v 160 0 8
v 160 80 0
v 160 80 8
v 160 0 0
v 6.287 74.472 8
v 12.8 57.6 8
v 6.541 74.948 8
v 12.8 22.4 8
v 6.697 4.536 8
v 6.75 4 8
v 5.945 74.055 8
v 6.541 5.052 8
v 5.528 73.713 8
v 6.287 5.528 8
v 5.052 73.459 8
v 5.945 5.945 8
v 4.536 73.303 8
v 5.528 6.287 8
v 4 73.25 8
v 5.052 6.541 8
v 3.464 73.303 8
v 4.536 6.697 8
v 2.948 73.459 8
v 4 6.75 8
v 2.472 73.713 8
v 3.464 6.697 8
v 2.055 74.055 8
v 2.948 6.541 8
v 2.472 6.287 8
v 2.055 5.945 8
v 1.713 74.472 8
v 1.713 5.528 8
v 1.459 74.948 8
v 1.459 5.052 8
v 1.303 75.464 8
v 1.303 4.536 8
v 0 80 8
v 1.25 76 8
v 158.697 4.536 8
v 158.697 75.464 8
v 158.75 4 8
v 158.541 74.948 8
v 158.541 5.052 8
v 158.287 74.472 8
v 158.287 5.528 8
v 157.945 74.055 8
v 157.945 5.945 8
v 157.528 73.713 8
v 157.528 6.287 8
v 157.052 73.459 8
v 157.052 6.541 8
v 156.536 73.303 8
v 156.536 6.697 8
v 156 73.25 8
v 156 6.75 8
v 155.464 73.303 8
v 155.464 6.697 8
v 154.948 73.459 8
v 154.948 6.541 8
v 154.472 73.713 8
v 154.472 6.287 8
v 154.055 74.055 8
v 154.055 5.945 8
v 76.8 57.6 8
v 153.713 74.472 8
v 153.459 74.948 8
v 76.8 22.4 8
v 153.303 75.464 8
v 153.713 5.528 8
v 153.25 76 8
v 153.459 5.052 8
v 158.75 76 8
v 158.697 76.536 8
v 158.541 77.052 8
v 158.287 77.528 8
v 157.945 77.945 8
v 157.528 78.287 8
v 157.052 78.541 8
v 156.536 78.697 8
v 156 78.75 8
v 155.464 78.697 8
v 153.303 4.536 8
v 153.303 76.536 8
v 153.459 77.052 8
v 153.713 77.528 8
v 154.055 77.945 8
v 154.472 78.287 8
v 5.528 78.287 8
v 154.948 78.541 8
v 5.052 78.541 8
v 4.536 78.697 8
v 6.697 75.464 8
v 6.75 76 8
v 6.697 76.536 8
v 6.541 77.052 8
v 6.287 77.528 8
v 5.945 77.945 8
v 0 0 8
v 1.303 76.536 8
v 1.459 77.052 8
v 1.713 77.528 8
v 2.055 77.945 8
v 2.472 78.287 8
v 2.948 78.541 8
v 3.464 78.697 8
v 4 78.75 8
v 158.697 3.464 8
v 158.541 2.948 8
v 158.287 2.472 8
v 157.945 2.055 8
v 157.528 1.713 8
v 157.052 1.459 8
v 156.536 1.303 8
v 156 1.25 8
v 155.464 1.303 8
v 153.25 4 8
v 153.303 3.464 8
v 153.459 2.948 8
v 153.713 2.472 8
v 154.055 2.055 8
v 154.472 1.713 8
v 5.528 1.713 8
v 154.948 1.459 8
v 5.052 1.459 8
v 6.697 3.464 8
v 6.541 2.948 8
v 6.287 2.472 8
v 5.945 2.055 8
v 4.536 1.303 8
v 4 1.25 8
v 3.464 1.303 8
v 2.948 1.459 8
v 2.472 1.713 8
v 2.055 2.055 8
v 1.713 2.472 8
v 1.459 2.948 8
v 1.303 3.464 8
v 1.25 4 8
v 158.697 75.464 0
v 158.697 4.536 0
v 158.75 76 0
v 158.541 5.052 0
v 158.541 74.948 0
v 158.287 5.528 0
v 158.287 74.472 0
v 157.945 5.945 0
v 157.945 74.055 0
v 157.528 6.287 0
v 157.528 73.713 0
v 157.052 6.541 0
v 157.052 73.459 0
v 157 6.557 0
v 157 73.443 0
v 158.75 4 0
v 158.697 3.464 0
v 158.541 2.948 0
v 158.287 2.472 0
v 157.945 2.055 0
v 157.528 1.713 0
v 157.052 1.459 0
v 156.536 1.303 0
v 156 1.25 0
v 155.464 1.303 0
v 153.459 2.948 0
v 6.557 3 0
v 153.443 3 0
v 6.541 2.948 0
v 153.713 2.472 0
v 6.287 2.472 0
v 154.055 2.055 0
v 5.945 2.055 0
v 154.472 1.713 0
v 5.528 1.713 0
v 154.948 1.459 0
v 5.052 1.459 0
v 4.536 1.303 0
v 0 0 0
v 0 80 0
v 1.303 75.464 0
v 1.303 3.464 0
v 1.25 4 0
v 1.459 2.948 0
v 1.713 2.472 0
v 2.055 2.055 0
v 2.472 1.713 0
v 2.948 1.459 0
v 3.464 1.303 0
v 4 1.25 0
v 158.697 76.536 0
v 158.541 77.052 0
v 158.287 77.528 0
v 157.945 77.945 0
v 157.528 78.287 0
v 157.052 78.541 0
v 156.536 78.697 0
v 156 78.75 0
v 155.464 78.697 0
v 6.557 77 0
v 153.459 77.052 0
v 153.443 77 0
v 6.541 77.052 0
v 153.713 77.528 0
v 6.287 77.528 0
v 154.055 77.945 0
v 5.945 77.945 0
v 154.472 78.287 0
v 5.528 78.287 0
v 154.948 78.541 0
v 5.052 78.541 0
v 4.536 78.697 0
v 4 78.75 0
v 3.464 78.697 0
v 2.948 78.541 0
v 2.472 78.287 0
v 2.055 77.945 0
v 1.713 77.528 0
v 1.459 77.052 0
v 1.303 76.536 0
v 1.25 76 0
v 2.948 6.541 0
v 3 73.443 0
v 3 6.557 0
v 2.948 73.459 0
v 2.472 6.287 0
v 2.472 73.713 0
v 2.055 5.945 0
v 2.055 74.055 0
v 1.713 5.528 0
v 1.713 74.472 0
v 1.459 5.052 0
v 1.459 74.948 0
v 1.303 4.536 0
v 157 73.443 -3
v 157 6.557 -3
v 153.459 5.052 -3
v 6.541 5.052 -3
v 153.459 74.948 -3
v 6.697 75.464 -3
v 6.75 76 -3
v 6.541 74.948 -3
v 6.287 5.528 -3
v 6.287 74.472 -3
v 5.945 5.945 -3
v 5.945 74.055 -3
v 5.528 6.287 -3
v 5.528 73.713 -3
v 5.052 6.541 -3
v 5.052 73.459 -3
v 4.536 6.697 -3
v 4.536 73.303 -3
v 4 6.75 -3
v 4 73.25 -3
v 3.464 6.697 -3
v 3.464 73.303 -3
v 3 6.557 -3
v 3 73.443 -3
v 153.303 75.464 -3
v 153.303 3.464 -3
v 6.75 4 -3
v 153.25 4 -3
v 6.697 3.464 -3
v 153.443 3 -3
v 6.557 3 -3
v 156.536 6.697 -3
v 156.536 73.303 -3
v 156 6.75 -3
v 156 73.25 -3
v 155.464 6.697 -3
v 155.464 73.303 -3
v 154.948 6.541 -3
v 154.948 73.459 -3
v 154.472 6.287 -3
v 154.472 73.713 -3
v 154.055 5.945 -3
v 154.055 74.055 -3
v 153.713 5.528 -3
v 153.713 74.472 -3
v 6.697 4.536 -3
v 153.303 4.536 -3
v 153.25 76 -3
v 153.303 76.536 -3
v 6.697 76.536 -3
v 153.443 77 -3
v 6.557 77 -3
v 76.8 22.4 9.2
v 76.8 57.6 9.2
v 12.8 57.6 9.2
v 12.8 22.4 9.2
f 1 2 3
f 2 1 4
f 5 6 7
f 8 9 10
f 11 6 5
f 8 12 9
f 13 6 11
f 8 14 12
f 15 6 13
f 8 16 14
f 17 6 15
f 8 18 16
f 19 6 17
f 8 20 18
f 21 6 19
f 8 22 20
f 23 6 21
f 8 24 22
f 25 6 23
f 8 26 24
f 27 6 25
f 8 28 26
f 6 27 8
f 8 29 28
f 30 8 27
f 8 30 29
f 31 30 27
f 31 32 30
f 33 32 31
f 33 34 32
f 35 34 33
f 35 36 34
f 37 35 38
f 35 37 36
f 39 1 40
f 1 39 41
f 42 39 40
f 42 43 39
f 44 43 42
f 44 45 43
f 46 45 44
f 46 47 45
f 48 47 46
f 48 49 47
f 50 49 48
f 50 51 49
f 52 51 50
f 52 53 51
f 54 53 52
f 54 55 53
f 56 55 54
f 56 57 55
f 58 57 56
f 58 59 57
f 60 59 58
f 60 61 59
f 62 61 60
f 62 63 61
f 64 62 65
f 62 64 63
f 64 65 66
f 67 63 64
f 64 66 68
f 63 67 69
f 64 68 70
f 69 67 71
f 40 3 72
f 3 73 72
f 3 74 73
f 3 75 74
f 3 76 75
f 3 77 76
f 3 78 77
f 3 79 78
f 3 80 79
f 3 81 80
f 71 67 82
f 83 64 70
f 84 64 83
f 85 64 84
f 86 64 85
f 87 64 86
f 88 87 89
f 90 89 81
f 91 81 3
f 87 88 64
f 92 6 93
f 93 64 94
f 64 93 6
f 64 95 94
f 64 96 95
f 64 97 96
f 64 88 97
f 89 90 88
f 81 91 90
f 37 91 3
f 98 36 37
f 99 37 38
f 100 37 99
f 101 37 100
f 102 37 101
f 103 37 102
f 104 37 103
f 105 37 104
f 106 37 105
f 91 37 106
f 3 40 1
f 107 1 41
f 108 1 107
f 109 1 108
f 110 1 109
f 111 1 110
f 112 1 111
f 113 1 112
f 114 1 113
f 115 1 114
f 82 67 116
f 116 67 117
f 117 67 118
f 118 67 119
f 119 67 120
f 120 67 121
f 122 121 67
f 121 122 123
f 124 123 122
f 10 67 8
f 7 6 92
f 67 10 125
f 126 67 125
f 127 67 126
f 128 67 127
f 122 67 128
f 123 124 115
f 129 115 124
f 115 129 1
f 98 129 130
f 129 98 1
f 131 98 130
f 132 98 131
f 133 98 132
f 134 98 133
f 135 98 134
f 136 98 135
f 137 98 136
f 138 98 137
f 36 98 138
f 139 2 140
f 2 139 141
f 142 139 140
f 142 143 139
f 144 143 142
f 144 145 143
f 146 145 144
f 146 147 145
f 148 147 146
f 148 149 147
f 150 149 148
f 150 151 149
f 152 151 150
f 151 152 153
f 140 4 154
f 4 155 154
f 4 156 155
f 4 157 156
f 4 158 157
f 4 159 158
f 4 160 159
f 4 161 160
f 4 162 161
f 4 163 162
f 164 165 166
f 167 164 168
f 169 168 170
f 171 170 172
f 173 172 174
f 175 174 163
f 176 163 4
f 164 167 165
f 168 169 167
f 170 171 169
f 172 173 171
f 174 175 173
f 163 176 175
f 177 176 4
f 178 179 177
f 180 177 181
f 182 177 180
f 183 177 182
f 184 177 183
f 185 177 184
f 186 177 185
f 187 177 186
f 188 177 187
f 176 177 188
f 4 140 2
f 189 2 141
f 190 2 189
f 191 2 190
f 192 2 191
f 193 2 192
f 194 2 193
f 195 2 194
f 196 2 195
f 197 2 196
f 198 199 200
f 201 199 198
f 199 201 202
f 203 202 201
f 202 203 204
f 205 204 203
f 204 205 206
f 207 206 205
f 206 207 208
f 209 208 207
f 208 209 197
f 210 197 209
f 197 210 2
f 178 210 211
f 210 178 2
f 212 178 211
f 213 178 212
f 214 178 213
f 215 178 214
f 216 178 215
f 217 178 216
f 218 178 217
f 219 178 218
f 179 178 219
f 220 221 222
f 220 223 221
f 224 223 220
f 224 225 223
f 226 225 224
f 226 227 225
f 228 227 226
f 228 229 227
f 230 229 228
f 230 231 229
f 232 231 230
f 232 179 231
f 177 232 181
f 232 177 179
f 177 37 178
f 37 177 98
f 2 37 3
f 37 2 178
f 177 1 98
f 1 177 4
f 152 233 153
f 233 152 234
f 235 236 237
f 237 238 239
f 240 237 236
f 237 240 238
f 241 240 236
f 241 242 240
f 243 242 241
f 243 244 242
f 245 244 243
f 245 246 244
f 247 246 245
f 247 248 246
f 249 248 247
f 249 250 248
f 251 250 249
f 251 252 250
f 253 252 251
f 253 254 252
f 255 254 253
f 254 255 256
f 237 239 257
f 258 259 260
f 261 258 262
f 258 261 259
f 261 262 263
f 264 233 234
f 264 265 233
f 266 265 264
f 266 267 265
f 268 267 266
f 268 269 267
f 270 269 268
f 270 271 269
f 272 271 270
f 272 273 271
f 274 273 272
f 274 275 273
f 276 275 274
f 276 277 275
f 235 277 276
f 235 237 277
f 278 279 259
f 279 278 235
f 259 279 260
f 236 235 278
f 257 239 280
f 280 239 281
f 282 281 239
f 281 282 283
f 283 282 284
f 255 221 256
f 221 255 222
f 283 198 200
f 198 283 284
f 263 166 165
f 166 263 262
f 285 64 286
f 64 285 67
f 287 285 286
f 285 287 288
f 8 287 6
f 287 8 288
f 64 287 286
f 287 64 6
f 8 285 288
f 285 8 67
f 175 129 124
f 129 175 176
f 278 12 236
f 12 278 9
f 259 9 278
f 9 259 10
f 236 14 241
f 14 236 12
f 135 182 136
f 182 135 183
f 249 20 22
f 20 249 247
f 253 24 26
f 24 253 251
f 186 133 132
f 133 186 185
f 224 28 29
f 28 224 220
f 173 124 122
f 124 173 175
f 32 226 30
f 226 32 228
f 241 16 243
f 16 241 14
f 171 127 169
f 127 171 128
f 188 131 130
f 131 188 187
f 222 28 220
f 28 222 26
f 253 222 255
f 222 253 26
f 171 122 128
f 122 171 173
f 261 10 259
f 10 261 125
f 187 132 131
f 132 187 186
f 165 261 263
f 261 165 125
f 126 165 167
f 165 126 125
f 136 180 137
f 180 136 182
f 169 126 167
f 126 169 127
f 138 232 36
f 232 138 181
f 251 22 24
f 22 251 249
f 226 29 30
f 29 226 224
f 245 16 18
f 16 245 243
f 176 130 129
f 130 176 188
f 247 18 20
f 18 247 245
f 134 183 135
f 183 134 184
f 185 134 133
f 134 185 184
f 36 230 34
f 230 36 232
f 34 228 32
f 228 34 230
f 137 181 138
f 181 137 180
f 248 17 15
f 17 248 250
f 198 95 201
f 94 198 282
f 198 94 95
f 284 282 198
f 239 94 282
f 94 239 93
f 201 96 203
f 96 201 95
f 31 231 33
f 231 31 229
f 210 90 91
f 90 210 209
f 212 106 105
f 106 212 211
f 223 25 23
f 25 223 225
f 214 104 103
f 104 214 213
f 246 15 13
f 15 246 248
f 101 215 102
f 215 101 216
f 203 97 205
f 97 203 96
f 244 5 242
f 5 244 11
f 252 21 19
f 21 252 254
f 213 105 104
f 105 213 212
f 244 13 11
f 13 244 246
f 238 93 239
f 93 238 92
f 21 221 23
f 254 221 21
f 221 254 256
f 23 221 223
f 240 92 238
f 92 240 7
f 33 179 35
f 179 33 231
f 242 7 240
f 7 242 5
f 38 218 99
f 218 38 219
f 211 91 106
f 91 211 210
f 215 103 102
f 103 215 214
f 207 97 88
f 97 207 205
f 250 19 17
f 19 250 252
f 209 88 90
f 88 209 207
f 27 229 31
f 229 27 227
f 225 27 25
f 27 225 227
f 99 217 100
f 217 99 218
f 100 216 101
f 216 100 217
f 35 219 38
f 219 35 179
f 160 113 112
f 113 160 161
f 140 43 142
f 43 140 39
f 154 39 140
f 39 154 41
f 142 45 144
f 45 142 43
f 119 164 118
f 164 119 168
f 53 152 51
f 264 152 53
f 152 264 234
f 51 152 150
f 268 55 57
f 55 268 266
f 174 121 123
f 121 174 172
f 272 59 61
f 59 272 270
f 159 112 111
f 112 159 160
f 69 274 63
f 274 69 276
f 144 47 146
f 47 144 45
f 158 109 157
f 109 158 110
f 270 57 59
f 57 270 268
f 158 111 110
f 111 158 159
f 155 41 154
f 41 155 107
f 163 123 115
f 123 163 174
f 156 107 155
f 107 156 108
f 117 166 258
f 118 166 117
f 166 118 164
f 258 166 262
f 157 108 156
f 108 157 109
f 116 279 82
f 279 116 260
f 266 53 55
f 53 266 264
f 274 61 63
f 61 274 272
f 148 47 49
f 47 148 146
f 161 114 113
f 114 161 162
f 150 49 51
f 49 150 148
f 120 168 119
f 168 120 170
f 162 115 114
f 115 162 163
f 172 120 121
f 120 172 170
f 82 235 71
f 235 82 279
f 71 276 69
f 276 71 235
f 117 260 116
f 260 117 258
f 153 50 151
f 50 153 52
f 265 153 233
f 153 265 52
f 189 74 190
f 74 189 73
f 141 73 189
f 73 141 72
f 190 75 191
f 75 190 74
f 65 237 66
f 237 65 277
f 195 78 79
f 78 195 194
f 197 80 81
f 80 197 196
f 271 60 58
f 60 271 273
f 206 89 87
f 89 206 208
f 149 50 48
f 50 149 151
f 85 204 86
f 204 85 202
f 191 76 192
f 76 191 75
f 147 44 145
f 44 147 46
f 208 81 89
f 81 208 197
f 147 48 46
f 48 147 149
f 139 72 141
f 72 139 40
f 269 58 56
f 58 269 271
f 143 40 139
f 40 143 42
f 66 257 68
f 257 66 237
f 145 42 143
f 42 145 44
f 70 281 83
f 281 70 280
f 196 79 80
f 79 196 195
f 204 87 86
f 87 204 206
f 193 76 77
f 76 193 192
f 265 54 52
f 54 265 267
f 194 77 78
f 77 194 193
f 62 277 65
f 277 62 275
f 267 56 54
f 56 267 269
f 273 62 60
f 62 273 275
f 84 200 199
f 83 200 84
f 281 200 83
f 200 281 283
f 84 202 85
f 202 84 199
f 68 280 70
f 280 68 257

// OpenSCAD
$fn = 32;

// ----------------------------------------------------------------------
// Enclosure lid: 160 x 80 x 8 mm, 4 bolt holes
// ----------------------------------------------------------------------

// --- parameters (mm) ---
length = 160;             // lid length, X
width = 80;               // lid width, Y
plate_t = 8;              // lid plate thickness
bolt_d = 5.5;             // bolt clearance
boss_lip = 4;             // bolt hole inset from the corner
sink = 1;                 // overlap of the lip and ribs into the plate
lip_h = 4;                // lip height below the plate
lip_wall = 3;             // lip wall thickness
label_h = 1.2;            // raised marking pad

module plate() {
  cube([length, width, plate_t]);
  /* lip that drops into the housing opening, sunk into the plate */
  translate([lip_wall, lip_wall, -lip_h + sink]) cube([length - 2 * lip_wall, width - 2 * lip_wall, lip_h]);
  /* raised marking pad on top, sunk 1 mm into the plate */
  translate([length * 0.08, width * 0.28, plate_t - 1]) cube([length * 0.4, width * 0.44, label_h + 1]);
}

difference() {
  plate();
  /* bolt pattern matching the corner bosses */
  for (sx = [0, 1]) for (sy = [0, 1])
    translate([sx * (length - 2 * boss_lip) + boss_lip, sy * (width - 2 * boss_lip) + boss_lip, -lip_h - 1])
      cylinder(h = plate_t + lip_h + 2, d = bolt_d);
}
